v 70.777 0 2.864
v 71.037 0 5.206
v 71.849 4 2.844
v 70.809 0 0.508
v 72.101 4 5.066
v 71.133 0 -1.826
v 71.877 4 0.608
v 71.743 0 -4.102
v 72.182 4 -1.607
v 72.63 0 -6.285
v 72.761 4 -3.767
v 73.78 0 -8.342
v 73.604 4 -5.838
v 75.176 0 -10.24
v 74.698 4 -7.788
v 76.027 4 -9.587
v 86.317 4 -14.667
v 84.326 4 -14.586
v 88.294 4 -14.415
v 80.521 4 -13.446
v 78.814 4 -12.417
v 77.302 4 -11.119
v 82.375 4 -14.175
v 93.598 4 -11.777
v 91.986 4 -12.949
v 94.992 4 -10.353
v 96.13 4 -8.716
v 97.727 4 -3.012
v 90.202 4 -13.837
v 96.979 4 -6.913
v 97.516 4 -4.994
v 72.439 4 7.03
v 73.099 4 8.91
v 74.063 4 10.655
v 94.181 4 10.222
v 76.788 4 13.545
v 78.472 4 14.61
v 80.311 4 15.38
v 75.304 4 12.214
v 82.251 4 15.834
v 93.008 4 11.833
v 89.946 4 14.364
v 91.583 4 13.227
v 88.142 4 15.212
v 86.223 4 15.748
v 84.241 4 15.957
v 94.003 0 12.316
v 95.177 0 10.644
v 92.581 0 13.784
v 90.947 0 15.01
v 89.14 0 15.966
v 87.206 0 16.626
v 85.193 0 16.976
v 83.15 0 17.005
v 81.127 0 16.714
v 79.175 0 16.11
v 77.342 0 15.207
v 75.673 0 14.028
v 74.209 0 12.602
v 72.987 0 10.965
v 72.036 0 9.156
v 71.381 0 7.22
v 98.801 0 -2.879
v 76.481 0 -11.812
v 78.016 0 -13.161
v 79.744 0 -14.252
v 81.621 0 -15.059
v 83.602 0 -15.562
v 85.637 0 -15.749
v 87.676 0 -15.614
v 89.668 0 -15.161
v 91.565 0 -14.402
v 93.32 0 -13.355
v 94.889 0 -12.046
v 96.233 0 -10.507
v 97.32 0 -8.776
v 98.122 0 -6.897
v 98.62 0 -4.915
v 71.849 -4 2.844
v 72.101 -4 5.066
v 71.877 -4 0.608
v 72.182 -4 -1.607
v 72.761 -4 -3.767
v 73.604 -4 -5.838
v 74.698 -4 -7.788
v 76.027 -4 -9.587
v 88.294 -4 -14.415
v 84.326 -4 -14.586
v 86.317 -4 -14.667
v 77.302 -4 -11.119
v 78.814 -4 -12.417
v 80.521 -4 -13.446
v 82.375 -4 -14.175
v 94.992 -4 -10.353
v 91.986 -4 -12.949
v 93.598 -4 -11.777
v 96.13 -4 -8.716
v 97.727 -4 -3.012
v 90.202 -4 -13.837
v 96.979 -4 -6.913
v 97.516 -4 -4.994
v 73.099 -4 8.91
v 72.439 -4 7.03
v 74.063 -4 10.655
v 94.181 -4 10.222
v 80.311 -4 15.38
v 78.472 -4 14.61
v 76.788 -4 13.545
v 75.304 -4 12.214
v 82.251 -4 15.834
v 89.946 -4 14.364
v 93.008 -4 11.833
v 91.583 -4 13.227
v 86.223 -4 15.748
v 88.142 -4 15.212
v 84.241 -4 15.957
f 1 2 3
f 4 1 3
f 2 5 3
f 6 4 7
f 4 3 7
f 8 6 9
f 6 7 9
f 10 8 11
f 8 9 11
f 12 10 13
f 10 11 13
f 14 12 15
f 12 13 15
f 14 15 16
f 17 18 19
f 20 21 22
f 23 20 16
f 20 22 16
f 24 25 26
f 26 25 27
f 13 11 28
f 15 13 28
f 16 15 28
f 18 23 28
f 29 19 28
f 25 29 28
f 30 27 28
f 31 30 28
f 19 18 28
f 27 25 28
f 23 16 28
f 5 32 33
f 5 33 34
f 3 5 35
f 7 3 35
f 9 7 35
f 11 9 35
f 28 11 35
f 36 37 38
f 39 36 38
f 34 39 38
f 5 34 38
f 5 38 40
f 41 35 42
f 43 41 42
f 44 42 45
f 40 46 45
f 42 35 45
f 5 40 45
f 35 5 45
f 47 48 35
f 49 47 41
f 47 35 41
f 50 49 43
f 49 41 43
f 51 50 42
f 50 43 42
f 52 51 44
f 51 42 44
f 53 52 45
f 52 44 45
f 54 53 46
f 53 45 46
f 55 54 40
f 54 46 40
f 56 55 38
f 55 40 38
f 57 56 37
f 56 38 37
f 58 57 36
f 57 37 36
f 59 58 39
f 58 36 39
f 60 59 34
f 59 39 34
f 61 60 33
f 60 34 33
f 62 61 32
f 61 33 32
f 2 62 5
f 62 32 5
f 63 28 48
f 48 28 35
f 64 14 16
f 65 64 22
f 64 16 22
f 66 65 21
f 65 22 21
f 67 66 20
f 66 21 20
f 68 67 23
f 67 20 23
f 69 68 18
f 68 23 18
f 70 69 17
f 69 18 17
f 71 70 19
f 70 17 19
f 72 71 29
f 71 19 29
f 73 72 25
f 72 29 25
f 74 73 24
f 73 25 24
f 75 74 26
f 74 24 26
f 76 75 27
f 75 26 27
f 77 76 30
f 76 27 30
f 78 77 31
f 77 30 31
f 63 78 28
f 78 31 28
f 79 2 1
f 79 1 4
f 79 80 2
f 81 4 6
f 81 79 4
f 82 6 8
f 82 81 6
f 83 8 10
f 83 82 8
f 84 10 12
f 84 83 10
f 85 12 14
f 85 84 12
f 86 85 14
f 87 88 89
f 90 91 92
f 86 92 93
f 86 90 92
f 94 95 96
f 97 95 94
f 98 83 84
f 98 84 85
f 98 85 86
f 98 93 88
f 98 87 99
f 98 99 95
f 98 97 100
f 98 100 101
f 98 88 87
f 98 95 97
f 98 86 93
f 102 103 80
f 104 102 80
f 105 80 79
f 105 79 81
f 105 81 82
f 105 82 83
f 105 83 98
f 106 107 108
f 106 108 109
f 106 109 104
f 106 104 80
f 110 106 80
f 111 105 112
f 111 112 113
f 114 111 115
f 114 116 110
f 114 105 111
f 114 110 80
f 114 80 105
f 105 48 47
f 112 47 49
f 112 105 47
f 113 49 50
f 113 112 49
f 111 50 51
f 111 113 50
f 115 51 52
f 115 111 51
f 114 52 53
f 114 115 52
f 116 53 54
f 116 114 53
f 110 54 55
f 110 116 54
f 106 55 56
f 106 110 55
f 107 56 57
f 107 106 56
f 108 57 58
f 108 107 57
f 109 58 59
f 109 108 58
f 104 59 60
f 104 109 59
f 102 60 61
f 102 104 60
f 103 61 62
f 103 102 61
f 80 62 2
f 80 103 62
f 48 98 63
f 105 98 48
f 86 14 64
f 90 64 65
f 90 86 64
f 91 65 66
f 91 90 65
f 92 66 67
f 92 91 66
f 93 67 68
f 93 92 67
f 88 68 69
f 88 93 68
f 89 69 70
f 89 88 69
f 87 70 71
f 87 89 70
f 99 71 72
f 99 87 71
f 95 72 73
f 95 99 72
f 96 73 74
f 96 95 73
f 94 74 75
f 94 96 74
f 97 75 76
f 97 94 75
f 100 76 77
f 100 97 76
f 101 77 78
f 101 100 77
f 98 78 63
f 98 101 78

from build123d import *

# Parameters (mm, degrees)
F1_DEPTH = 4
F1_TAPER = 15


with BuildPart() as f1:
    # F0 (on Front) → F1 (new body, symmetric)
    with BuildSketch(Plane.XZ):
        with BuildLine():
            ThreePointArc((86.7407649822, -6.1106237106), (82.5, 0), (83.1172983508, 7.4123378574))
            Line((83.1172983508, 7.4123378574), (95.1771540786, 10.6437664606))
            ThreePointArc((95.1771540786, 10.6437664606), (81.1272632347, 16.7142332691), (71.0371981223, 5.2059499033))
            ThreePointArc((71.0371981223, 5.2059499033), (71.4025042649, -2.9735650202), (75.175897327, -10.2398858059))
            ThreePointArc((75.175897327, -10.2398858059), (89.6682917231, -15.1613189985), (98.8006207101, -2.8791951075))
            Line((98.8006207101, -2.8791951075), (86.7407649822, -6.1106237106))
        make_face()
        with BuildLine():
            Line((95.1771540786, 10.6437664606), (83.1172983508, 7.4123378574))
            ThreePointArc((83.1172983508, 7.4123378574), (82.5, 0), (86.7407649822, -6.1106237106))
            Line((86.7407649822, -6.1106237106), (98.8006207101, -2.8791951075))
            Line((98.8006207101, -2.8791951075), (95.1771540786, 10.6437664606))
        make_face()
    extrude(amount=F1_DEPTH, both=True, taper=F1_TAPER)


solid = f1.part
